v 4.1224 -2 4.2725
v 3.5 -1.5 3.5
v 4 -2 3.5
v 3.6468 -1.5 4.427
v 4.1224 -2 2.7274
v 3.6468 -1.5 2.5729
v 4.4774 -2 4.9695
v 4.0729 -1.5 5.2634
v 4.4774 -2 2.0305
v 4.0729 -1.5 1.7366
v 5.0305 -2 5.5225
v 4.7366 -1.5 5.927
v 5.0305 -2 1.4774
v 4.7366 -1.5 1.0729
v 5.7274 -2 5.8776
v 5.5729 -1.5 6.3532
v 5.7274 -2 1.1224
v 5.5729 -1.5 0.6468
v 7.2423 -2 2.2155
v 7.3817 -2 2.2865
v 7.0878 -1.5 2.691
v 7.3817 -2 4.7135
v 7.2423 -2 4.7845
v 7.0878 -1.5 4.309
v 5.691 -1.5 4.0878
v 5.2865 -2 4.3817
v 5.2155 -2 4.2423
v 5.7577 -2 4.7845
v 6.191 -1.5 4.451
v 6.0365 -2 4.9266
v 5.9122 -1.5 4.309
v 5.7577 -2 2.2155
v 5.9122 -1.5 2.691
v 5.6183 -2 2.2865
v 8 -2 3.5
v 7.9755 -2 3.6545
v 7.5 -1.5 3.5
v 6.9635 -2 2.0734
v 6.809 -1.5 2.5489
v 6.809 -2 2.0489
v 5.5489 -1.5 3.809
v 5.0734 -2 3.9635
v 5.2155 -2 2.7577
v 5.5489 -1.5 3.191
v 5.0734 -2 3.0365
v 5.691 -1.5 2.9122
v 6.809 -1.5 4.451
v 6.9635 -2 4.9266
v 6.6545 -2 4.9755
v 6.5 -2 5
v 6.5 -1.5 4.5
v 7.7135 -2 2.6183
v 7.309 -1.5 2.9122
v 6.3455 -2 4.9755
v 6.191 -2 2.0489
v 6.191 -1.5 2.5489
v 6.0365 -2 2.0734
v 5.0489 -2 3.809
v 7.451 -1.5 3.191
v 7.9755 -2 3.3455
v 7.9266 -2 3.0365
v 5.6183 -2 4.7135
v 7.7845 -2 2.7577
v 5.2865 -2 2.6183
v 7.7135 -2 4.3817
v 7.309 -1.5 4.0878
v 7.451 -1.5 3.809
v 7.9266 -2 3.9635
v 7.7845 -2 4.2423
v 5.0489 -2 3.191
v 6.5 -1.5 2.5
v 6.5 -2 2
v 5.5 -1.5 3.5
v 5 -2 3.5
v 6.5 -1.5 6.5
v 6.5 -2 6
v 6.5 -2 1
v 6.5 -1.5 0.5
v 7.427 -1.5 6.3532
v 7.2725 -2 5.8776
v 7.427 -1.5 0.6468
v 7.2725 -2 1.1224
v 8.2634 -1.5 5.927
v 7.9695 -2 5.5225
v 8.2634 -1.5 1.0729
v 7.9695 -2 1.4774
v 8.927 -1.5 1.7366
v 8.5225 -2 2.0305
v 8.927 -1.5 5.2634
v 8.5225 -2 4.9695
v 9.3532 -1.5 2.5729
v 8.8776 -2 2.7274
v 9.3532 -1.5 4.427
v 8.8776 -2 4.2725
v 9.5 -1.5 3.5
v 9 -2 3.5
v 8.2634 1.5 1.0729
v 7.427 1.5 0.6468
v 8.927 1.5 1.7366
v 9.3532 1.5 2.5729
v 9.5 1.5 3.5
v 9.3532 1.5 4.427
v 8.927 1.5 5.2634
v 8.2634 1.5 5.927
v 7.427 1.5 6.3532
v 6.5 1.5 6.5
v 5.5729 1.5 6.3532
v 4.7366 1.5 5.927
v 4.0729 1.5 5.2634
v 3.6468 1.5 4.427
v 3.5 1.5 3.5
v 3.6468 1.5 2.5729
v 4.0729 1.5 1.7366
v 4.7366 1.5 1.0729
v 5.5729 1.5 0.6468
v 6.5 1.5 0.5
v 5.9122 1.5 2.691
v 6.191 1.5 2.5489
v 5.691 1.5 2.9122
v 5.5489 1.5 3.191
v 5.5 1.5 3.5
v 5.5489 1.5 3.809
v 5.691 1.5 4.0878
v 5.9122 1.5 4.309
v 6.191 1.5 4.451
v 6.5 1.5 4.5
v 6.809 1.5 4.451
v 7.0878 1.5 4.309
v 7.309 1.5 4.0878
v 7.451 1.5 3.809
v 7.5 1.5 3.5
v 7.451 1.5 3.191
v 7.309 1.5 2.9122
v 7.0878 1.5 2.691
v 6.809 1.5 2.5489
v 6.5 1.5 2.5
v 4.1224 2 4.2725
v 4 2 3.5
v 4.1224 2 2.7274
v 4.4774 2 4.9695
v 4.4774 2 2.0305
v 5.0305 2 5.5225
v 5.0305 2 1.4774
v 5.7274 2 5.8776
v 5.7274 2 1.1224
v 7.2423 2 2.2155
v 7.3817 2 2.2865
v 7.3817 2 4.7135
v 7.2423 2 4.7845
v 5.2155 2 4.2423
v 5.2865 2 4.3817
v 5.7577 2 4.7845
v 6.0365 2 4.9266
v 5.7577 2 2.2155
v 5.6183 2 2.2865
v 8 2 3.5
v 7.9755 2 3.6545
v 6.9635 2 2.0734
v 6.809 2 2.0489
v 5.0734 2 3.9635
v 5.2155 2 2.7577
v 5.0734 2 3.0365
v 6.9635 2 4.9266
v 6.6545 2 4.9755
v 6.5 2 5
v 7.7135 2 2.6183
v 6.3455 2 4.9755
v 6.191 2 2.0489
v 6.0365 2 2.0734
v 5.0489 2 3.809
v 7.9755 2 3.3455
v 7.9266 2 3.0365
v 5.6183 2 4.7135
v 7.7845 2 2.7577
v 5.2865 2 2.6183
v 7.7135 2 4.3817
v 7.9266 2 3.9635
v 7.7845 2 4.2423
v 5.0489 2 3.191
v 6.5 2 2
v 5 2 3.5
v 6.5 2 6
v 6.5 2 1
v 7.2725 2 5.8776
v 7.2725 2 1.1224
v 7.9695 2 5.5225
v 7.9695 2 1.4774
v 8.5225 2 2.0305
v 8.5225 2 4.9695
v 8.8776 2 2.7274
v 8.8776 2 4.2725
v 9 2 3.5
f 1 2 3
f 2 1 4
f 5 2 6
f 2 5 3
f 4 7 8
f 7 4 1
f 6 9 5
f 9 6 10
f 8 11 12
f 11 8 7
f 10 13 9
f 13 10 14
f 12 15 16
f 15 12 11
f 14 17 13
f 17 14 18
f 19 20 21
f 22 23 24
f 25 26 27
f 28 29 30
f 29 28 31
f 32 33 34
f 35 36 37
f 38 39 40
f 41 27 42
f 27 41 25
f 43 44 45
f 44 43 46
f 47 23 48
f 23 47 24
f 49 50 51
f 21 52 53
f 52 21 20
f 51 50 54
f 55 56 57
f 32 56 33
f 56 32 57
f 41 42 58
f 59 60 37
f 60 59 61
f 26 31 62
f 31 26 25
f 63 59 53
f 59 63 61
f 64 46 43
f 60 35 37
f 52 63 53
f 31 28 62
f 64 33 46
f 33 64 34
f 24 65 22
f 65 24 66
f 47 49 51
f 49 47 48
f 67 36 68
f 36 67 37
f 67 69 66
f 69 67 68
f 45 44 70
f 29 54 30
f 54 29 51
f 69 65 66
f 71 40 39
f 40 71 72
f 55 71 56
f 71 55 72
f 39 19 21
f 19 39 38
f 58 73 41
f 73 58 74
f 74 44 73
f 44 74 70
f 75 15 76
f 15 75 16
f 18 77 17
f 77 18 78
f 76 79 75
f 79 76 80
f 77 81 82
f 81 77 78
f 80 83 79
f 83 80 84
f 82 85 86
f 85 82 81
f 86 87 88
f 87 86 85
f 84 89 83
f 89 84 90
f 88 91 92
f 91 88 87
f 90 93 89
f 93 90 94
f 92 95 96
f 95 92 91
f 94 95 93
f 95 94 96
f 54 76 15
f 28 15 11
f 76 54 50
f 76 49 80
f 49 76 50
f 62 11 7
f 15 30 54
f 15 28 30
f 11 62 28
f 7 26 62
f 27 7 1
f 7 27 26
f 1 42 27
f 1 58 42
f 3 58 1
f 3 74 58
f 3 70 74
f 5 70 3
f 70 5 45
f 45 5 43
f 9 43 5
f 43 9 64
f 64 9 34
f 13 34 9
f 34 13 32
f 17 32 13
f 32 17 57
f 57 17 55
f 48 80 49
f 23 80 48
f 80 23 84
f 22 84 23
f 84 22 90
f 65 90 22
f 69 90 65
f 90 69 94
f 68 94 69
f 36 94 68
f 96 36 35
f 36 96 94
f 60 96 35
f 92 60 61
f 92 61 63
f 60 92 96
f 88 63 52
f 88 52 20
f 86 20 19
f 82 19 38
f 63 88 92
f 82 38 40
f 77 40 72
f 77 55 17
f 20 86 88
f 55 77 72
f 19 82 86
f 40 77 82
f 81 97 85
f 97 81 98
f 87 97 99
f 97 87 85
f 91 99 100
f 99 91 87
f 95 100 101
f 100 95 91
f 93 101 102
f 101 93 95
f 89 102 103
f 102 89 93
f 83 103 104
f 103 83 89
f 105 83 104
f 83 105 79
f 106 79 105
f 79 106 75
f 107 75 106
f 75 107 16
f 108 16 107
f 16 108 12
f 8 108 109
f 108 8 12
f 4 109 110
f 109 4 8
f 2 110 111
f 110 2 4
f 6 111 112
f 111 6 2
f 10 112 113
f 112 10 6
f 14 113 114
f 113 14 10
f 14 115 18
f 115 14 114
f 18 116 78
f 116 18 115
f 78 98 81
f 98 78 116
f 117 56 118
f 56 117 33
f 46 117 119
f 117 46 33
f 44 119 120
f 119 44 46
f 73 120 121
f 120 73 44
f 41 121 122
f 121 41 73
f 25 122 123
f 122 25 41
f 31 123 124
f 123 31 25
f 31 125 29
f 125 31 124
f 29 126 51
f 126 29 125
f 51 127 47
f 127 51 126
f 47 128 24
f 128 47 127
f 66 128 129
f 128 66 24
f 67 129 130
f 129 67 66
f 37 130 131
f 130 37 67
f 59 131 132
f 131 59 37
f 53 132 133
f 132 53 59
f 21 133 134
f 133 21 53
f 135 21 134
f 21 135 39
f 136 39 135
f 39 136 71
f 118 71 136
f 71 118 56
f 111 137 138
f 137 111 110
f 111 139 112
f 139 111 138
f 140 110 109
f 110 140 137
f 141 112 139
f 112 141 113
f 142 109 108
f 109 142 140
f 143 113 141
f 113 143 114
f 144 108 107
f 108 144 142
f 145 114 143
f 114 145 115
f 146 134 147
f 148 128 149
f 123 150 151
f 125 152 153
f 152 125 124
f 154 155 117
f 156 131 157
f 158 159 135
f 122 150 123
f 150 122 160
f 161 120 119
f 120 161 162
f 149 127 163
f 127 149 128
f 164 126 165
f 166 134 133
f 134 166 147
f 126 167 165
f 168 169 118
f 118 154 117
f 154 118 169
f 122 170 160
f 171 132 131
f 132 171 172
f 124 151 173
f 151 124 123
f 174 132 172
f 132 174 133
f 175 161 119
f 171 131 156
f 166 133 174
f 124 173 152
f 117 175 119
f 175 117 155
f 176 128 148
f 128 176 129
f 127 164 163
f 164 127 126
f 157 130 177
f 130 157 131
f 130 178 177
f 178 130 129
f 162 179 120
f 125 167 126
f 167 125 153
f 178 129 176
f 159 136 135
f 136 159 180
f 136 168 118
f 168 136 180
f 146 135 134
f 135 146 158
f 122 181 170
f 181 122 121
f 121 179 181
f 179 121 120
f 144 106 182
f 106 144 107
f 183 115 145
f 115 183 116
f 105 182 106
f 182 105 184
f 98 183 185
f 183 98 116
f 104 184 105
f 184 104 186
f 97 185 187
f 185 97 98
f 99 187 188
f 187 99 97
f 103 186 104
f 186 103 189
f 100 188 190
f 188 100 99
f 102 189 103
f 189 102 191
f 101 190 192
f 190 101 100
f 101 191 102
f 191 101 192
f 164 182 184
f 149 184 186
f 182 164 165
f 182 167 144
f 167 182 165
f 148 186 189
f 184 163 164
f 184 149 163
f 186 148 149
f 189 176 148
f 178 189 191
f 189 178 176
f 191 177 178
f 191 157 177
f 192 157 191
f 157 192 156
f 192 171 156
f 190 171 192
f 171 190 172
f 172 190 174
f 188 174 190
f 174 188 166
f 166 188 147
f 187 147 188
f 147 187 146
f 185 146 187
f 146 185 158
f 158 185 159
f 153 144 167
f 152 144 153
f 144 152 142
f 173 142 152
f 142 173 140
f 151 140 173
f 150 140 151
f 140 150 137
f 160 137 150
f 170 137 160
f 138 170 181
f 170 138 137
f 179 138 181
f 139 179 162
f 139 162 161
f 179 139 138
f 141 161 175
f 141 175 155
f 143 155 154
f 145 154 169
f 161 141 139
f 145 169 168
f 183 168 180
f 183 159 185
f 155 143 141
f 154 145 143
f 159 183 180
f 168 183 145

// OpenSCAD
 $fn = 20; 
// modul amdg_chamfered_logo nahackovan z:
//(c)2018-01-06 Alex Gibson: admg chamfered_logo text module
//Licence: Creative Commons [CC BY-SA 4.0]  https://creativecommons.org/licenses/by-sa/4.0/

module logo () {
	difference () {
	union () {
		translate ([1, 0.5, 0]) offset (delta = 0.5) { resize ([0,50,0],auto=true) import ("magirus.dxf"); }
		translate ([6.5,3.5,0]) circle (3);
		}
	translate ([6.5,3.5,0])  circle (1);
	}
}


module admg_chamfered_logo (text_depth,chamfer_depth,chamfer_width) {
	translate ([0,0,text_depth-chamfer_depth]) difference() {
		translate ([0,0,-(text_depth-chamfer_depth)]) linear_extrude (text_depth) logo () ;
		minkowski () {
			difference () {
				cube ([500,500,text_depth],center=true);
				translate ([0,0,-text_depth]) linear_extrude (text_depth*2) logo () ;
			}
			translate ([0,0,text_depth/2]) cylinder (chamfer_depth,0,chamfer_width);
		}
	}
}


module final () {
	admg_chamfered_logo(2,0.5,0.5);
	mirror ([0,0,1]) admg_chamfered_logo(2,0.5,0.5);
}

rotate ([90,0,0]) final ();
